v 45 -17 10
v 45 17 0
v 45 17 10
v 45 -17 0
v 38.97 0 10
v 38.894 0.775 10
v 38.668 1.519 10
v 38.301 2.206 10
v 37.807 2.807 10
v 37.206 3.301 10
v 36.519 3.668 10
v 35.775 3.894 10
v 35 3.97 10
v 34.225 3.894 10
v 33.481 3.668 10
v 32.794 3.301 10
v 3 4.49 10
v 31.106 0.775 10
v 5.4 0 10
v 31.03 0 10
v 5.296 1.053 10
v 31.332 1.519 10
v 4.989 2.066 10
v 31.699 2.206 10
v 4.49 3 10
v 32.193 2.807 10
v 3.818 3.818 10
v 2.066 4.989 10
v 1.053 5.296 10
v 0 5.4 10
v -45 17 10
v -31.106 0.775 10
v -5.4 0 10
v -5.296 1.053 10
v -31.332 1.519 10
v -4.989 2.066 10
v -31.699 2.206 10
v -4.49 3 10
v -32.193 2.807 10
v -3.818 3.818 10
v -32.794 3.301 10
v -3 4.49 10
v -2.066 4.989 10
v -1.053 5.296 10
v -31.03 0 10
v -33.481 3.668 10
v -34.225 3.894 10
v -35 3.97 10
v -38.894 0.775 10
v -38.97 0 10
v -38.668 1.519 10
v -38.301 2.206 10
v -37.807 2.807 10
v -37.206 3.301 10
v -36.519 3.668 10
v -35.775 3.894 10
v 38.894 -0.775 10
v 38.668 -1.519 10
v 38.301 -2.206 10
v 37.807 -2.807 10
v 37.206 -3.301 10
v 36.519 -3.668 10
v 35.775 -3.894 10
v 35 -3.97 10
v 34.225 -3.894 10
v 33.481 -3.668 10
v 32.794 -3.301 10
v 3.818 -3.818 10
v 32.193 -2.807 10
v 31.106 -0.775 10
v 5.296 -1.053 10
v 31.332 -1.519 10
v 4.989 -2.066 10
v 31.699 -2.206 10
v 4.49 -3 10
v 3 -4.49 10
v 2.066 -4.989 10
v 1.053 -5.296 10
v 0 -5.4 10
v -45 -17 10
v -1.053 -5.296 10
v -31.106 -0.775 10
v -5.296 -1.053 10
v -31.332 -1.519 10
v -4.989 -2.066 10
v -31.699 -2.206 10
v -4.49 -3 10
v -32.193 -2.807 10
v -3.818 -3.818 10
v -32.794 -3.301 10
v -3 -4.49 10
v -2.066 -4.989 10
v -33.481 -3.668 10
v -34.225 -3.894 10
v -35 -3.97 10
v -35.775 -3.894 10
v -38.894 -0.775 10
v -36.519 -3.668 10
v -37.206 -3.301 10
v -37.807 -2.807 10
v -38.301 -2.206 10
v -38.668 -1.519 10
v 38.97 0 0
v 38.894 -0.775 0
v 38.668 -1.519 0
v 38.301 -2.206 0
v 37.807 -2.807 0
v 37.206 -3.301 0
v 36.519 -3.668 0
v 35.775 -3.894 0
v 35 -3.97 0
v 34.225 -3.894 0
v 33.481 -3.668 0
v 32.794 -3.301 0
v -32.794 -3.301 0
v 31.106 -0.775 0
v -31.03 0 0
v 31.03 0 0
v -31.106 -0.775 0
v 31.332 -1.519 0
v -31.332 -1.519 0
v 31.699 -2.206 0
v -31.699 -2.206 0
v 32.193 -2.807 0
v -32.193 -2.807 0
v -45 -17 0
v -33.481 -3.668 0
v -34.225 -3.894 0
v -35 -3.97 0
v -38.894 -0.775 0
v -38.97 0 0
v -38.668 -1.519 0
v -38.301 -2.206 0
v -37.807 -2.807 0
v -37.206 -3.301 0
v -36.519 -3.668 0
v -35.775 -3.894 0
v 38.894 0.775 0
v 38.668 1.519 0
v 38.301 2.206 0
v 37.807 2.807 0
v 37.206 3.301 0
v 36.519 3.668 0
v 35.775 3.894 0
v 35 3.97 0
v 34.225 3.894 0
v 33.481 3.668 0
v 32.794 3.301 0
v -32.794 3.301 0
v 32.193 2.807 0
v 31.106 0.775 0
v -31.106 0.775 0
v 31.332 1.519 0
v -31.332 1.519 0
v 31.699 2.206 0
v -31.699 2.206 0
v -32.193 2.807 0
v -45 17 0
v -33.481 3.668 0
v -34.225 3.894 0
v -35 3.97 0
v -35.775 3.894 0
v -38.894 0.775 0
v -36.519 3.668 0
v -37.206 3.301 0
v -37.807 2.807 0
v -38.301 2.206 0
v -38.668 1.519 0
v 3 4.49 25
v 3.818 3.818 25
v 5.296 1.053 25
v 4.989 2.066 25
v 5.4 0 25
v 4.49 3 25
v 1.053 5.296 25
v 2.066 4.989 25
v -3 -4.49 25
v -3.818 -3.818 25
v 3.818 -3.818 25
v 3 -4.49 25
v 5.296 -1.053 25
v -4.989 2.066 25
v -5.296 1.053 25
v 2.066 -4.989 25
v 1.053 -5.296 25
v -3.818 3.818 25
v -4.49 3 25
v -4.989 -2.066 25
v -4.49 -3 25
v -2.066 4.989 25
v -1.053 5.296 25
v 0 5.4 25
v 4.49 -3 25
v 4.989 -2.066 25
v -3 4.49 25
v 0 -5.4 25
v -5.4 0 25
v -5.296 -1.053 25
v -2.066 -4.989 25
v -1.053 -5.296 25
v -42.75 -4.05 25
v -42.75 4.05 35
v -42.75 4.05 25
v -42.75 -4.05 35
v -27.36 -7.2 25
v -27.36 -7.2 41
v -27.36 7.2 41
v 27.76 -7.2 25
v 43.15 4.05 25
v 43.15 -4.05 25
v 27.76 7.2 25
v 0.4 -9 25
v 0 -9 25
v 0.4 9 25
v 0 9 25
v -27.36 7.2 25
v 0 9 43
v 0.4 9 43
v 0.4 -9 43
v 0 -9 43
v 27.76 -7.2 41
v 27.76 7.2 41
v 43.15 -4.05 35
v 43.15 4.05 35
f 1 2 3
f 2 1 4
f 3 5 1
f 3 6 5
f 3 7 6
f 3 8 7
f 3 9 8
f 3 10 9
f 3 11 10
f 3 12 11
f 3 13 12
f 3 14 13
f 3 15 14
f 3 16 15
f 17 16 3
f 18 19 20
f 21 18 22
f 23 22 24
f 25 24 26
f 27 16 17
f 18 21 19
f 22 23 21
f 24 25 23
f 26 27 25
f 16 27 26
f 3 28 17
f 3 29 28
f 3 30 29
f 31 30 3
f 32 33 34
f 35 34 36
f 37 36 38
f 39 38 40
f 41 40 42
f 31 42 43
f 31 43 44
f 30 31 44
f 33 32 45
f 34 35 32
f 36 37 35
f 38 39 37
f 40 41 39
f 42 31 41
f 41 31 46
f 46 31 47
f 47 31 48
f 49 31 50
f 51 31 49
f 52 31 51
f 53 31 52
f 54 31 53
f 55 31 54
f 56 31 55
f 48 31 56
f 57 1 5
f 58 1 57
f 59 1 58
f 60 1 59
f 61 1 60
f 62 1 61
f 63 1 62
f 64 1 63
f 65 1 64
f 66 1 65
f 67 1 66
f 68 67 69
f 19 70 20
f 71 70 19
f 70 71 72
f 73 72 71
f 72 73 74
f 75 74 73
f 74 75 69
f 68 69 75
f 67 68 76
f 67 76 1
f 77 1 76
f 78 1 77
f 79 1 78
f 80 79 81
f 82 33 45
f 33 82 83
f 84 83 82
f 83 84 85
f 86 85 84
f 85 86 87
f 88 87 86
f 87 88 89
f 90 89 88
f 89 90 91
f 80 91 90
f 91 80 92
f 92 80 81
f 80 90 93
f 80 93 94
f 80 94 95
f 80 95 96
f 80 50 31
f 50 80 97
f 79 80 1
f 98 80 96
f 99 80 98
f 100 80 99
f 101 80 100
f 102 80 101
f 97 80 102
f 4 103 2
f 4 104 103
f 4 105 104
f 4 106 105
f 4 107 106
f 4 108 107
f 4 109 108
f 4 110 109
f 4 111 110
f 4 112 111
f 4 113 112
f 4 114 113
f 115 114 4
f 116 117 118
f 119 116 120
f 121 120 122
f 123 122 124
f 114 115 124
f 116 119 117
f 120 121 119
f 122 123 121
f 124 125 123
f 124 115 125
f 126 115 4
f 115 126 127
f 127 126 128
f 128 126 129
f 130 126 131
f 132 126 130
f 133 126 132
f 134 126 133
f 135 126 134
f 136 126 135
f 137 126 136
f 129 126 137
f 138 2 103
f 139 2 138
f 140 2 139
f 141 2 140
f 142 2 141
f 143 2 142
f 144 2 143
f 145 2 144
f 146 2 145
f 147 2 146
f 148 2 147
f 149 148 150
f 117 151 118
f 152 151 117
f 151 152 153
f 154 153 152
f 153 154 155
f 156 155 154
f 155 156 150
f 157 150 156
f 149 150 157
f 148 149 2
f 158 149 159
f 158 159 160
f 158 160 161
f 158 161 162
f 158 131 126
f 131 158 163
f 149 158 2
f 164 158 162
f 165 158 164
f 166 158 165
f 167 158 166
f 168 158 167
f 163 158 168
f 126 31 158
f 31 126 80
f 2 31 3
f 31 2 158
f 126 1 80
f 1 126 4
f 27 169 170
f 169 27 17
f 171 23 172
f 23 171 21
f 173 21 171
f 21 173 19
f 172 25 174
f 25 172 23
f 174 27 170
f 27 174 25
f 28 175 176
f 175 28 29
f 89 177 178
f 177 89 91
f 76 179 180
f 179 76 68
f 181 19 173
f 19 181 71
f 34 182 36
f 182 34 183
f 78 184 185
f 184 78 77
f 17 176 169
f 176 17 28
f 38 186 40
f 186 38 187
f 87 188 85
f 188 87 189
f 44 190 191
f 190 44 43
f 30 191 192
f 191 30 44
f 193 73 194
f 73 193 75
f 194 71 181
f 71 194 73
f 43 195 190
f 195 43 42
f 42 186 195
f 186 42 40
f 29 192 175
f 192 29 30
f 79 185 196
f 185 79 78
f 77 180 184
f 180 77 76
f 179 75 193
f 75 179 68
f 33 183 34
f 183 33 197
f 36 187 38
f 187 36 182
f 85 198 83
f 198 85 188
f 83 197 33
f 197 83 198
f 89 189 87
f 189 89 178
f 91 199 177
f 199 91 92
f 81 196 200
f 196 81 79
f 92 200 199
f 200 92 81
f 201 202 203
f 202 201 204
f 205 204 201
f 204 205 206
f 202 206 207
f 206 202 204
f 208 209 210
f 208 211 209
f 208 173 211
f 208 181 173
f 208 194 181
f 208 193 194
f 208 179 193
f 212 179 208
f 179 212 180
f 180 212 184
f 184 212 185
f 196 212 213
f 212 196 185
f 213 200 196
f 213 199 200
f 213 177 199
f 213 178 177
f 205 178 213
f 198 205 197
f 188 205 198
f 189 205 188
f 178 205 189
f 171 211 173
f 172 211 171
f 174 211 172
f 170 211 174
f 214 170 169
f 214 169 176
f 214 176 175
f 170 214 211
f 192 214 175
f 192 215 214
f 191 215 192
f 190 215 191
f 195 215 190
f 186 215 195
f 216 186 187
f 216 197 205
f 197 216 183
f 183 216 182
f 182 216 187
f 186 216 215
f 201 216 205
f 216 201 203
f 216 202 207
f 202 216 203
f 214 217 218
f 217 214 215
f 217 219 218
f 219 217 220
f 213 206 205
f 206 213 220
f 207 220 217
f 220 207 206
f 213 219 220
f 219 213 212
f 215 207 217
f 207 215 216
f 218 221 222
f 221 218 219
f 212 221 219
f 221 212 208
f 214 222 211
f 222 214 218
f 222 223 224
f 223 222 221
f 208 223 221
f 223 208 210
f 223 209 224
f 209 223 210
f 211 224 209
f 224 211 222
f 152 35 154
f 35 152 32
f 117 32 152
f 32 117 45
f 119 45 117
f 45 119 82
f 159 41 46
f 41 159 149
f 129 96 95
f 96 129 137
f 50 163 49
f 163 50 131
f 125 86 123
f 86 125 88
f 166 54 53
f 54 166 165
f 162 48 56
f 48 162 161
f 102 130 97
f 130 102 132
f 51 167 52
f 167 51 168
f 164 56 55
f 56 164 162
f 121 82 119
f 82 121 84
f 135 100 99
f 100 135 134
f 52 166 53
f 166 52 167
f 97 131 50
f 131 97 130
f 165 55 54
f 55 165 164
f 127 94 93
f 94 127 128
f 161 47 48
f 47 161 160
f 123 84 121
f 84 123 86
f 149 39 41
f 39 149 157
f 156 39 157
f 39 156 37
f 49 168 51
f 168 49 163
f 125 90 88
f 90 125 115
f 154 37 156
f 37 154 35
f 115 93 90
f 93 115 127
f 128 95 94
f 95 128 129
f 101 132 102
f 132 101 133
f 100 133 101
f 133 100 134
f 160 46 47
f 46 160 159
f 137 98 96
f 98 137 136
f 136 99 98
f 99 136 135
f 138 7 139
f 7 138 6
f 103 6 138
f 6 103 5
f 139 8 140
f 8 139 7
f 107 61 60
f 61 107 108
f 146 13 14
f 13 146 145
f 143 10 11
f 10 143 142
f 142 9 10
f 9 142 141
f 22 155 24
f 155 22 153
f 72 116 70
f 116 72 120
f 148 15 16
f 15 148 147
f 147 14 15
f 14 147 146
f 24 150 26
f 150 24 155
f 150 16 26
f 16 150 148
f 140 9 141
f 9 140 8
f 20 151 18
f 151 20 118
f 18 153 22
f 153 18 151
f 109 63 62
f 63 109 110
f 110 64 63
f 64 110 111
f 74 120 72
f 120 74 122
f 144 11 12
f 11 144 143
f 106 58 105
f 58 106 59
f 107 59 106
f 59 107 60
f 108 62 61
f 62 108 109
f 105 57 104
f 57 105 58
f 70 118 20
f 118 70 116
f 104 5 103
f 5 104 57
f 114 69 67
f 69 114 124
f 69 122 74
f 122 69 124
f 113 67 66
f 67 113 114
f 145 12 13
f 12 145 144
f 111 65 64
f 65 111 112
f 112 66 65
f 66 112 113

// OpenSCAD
$fn = 32;

// ----------------------------------------------------------------------
// Boat cleat: 90 mm base, horn 34 mm up
// ----------------------------------------------------------------------

// --- parameters (mm) ---
base_l = 90;              // base length
base_w = 34;              // base width
base_t = 10;              // base thickness
horn_len = 85.5;          // horn length
horn_d = 18;              // horn diameter at the middle
horn_z = 34;              // horn axis height
end_drop = 8;             // how far the horn tips drop
post_d = 10.8;            // centre post diameter
holes_d = 7.94;           // fixing holes
hole_x = 35;              // fixing hole spacing

difference() {
  union() {
    translate([-45, -17, 0]) cube([base_l, base_w, base_t]);
    /* centre post, sunk 1 mm into the base */
    translate([0, 0, 9]) cylinder(h = 25, d = post_d);
    /* horn: a hull chain of boxes, full in the middle and lighter at the tips */
    hull() {
      translate([-42.75, -4.05, 25]) cube([0.4, 8.1, 10], center = false);
      translate([-27.36, -7.2, 25]) cube([0.4, 14.4, 16], center = false);
    }
    hull() {
      translate([-27.36, -7.2, 25]) cube([0.4, 14.4, 16], center = false);
      translate([0, -9, 25]) cube([0.4, 18, 18], center = false);
    }
    hull() {
      translate([0, -9, 25]) cube([0.4, 18, 18], center = false);
      translate([27.36, -7.2, 25]) cube([0.4, 14.4, 16], center = false);
    }
    hull() {
      translate([27.36, -7.2, 25]) cube([0.4, 14.4, 16], center = false);
      translate([42.75, -4.05, 25]) cube([0.4, 8.1, 10], center = false);
    }
  }
  translate([-35, 0, -2.5]) cylinder(h = base_t + 5, d = holes_d);
  translate([35, 0, -2.5]) cylinder(h = base_t + 5, d = holes_d);
}
